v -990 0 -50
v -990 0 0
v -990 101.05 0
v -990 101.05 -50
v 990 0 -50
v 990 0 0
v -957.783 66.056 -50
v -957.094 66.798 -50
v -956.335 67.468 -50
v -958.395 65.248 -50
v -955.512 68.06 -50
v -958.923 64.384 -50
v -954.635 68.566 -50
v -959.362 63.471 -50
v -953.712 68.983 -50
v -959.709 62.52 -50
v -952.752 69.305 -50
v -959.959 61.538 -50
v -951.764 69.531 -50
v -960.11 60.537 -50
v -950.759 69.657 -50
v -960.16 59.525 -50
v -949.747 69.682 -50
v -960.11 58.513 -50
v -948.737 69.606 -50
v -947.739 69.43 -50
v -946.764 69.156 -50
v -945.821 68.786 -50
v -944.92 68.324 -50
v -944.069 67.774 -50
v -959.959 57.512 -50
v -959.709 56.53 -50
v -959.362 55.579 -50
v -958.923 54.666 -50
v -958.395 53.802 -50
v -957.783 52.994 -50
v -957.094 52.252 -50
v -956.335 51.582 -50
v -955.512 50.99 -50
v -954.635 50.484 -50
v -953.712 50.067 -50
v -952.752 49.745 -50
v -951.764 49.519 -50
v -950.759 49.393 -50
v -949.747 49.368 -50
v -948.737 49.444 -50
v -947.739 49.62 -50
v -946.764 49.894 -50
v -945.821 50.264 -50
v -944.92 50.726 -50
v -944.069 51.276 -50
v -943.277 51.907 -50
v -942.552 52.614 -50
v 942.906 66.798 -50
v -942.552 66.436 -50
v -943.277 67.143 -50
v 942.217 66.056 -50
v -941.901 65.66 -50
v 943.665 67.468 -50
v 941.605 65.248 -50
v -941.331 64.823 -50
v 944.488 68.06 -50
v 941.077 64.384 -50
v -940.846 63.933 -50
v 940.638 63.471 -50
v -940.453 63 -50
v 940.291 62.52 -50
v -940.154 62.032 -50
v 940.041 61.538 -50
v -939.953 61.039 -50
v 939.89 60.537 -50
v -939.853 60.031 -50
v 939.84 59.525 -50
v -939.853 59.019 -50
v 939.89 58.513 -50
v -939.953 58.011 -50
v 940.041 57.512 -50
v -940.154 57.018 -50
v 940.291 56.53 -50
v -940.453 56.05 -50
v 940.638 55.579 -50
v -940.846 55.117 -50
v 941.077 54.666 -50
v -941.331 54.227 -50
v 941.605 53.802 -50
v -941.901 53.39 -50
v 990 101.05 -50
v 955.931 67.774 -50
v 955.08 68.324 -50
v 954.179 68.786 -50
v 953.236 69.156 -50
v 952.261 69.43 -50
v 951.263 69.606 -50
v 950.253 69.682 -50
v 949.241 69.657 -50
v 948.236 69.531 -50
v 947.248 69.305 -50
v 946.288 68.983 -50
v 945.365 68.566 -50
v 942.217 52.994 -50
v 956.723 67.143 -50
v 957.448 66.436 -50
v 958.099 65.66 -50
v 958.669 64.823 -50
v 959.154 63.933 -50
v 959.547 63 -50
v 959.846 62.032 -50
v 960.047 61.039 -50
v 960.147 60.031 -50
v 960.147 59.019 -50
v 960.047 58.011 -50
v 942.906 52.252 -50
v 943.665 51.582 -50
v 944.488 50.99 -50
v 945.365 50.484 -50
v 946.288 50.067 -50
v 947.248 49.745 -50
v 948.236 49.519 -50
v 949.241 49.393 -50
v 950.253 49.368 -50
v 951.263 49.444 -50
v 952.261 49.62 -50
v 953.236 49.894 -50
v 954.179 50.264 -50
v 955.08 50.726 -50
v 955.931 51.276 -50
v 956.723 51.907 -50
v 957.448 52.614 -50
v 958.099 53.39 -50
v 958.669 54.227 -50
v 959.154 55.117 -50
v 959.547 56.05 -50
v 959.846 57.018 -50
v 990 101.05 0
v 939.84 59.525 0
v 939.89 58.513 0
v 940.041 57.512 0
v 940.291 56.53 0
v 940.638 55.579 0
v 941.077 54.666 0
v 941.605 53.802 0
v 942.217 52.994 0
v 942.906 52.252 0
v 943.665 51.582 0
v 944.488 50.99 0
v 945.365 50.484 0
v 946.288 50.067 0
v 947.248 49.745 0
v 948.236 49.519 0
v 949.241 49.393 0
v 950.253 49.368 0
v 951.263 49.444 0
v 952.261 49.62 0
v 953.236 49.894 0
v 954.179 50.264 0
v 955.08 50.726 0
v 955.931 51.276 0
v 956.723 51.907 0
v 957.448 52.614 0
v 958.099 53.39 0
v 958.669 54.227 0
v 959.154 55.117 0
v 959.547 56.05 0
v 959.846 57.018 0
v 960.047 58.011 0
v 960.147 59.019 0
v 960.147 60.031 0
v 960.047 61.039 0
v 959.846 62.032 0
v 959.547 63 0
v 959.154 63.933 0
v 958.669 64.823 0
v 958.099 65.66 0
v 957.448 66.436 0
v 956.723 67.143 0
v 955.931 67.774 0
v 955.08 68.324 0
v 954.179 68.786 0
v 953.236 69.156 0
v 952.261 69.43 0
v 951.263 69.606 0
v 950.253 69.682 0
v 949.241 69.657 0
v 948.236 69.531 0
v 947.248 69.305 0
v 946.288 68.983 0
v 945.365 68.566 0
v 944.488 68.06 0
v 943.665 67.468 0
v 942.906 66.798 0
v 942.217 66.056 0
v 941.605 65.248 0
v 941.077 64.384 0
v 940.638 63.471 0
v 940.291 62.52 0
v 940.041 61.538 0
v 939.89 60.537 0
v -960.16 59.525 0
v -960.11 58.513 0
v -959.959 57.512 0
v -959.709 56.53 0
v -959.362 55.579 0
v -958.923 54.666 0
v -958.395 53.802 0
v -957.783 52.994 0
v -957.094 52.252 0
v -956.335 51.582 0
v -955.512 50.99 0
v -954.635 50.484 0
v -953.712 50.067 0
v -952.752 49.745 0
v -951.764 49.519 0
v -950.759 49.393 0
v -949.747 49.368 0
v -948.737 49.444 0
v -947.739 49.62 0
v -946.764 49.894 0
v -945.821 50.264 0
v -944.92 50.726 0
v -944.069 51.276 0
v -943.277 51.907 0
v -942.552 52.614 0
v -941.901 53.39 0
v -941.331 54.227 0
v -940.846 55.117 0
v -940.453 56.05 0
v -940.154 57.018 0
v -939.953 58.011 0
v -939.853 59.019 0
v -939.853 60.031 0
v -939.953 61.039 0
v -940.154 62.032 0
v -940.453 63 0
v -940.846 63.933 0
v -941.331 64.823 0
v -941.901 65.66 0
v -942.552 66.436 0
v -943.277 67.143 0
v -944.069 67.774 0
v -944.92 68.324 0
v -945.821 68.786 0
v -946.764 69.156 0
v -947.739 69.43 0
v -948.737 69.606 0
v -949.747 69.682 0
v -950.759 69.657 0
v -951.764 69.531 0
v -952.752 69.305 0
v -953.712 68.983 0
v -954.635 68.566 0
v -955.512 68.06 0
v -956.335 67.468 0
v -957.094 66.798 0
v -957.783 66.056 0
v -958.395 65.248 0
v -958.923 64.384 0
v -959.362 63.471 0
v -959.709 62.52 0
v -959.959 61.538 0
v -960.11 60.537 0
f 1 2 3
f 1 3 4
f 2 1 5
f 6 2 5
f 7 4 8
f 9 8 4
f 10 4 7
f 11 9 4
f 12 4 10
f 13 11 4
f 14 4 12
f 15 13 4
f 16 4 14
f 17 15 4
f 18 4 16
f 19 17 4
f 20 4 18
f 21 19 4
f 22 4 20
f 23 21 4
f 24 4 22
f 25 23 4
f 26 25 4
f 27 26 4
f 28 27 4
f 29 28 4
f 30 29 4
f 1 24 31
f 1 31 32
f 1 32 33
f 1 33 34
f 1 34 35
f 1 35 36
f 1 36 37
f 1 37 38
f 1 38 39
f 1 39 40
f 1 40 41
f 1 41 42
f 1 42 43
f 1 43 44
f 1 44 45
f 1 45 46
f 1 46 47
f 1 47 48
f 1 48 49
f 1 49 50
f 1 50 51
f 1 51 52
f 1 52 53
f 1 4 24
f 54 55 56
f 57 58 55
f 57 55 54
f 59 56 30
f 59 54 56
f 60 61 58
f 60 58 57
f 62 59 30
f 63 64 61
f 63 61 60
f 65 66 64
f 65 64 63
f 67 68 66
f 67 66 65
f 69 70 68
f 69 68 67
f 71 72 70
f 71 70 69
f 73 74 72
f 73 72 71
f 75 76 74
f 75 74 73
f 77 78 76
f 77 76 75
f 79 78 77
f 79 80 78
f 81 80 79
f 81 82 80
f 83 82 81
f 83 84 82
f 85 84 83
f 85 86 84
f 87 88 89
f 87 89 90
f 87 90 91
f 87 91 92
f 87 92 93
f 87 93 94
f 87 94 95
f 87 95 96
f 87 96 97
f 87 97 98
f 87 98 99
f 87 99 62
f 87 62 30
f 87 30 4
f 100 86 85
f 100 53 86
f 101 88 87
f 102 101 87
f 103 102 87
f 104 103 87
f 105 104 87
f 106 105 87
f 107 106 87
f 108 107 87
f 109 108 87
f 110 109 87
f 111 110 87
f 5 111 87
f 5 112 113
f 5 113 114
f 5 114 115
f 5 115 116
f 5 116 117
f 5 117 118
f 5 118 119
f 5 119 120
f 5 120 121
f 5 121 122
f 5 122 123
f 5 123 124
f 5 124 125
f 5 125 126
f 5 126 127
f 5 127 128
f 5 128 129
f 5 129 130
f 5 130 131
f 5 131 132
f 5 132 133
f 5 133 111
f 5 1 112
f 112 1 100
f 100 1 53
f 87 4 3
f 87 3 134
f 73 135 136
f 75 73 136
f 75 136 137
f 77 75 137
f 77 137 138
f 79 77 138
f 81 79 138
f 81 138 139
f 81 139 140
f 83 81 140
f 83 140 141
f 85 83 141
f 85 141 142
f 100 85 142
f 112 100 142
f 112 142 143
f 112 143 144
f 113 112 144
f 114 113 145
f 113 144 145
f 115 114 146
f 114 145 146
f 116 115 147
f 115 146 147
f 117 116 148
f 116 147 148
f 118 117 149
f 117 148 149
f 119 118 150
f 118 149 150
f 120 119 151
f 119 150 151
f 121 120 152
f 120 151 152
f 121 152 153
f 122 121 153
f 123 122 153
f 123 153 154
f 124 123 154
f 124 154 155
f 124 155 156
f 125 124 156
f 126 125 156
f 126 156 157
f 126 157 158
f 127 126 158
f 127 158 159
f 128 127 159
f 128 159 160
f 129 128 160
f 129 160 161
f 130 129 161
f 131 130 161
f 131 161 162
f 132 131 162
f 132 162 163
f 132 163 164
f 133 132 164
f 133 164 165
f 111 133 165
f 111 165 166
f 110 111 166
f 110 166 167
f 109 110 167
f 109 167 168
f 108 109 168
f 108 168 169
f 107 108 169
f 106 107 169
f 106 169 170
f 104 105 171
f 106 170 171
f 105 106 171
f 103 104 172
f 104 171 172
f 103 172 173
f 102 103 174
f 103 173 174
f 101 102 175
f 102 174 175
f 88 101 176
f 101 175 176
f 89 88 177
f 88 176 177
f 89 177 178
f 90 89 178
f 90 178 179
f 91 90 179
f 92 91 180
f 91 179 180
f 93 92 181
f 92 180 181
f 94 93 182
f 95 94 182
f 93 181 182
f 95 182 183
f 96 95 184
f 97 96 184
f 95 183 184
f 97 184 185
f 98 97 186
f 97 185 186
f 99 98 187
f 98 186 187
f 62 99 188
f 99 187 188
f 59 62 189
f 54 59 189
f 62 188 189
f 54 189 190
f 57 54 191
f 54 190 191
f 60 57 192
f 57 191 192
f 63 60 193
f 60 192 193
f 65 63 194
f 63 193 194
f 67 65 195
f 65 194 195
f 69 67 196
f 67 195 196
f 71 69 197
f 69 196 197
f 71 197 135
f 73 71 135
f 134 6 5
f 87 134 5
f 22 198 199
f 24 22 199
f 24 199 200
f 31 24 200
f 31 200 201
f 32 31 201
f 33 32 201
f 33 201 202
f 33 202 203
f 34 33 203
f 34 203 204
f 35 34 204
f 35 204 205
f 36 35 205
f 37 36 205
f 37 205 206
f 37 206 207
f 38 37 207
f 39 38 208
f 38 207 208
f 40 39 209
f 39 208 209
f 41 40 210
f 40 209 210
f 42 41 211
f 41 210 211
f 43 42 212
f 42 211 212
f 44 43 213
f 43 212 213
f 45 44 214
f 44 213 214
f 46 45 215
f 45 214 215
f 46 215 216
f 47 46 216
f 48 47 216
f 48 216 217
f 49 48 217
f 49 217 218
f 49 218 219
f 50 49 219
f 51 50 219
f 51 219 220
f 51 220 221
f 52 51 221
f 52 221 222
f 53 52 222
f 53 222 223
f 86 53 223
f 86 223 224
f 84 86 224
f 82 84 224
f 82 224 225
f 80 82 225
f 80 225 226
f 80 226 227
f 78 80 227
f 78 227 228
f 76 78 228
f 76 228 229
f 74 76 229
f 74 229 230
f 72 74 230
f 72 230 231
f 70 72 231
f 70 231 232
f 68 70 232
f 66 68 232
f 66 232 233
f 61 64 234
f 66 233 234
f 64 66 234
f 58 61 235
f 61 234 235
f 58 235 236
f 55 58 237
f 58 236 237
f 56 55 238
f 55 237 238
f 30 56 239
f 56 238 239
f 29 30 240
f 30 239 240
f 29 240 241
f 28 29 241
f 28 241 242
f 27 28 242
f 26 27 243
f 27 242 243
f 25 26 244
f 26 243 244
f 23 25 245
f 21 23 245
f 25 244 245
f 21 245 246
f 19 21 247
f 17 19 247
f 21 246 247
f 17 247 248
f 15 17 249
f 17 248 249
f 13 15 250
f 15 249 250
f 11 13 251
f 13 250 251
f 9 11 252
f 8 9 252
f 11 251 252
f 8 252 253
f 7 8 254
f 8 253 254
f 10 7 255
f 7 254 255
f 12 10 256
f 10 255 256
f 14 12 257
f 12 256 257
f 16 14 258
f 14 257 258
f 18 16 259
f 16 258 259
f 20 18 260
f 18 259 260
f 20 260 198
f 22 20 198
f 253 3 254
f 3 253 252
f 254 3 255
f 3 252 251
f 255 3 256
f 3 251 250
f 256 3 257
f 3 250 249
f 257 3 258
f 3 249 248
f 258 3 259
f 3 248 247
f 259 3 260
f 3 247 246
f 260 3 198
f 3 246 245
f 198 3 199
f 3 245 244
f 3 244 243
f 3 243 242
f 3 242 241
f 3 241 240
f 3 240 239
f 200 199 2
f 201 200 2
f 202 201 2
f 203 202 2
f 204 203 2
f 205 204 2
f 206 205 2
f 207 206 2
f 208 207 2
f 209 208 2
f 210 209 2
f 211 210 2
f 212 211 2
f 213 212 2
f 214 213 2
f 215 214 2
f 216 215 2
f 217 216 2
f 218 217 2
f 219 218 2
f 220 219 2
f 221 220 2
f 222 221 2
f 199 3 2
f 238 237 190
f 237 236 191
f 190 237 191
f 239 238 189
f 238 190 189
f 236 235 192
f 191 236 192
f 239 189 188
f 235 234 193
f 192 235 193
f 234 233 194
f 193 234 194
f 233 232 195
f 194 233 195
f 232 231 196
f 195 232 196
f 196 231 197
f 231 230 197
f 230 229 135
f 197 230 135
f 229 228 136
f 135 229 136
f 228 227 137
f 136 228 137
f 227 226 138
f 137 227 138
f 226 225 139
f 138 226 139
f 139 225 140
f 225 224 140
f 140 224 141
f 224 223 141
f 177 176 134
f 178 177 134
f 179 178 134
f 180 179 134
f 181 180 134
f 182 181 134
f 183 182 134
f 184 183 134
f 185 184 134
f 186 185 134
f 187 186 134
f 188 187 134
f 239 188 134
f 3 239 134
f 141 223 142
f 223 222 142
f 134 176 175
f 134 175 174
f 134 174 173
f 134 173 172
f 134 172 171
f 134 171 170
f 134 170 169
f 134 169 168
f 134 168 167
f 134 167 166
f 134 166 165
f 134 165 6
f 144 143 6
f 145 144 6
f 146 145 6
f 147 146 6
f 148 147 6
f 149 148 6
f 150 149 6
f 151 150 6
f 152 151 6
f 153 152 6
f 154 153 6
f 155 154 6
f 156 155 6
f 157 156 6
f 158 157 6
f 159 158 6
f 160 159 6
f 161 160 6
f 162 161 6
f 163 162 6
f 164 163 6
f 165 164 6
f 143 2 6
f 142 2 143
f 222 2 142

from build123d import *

# Parameters (mm, degrees)
SKETCH1_W           = 1980
SKETCH1_H           = 50
BOSS_EXTRUDE1_DEPTH = 101.05
SKETCH2_R           = 10.16
CUT_EXTRUDE1_DEPTH  = 997.399067894


with BuildPart() as part:
    # Sketch1 → Boss-Extrude1 (new body)
    with BuildSketch(Plane(origin=(0, 0, 0), x_dir=(1, 0, 0), z_dir=(0, 1, 0))):
        with Locations((0, 25)):
            Rectangle(SKETCH1_W, SKETCH1_H)
    extrude(amount=BOSS_EXTRUDE1_DEPTH)

    # Sketch2 → Cut-Extrude1 (cut, through all)
    with BuildSketch(Plane.XY):
        with Locations(Location((-950, 59.525, 0), (0, 0, 180))):
            Circle(SKETCH2_R)
        with Locations(Location((950, 59.525, 0), (0, 0, 180))):
            Circle(SKETCH2_R)
    extrude(amount=-CUT_EXTRUDE1_DEPTH, mode=Mode.SUBTRACT)


solid = part.part
